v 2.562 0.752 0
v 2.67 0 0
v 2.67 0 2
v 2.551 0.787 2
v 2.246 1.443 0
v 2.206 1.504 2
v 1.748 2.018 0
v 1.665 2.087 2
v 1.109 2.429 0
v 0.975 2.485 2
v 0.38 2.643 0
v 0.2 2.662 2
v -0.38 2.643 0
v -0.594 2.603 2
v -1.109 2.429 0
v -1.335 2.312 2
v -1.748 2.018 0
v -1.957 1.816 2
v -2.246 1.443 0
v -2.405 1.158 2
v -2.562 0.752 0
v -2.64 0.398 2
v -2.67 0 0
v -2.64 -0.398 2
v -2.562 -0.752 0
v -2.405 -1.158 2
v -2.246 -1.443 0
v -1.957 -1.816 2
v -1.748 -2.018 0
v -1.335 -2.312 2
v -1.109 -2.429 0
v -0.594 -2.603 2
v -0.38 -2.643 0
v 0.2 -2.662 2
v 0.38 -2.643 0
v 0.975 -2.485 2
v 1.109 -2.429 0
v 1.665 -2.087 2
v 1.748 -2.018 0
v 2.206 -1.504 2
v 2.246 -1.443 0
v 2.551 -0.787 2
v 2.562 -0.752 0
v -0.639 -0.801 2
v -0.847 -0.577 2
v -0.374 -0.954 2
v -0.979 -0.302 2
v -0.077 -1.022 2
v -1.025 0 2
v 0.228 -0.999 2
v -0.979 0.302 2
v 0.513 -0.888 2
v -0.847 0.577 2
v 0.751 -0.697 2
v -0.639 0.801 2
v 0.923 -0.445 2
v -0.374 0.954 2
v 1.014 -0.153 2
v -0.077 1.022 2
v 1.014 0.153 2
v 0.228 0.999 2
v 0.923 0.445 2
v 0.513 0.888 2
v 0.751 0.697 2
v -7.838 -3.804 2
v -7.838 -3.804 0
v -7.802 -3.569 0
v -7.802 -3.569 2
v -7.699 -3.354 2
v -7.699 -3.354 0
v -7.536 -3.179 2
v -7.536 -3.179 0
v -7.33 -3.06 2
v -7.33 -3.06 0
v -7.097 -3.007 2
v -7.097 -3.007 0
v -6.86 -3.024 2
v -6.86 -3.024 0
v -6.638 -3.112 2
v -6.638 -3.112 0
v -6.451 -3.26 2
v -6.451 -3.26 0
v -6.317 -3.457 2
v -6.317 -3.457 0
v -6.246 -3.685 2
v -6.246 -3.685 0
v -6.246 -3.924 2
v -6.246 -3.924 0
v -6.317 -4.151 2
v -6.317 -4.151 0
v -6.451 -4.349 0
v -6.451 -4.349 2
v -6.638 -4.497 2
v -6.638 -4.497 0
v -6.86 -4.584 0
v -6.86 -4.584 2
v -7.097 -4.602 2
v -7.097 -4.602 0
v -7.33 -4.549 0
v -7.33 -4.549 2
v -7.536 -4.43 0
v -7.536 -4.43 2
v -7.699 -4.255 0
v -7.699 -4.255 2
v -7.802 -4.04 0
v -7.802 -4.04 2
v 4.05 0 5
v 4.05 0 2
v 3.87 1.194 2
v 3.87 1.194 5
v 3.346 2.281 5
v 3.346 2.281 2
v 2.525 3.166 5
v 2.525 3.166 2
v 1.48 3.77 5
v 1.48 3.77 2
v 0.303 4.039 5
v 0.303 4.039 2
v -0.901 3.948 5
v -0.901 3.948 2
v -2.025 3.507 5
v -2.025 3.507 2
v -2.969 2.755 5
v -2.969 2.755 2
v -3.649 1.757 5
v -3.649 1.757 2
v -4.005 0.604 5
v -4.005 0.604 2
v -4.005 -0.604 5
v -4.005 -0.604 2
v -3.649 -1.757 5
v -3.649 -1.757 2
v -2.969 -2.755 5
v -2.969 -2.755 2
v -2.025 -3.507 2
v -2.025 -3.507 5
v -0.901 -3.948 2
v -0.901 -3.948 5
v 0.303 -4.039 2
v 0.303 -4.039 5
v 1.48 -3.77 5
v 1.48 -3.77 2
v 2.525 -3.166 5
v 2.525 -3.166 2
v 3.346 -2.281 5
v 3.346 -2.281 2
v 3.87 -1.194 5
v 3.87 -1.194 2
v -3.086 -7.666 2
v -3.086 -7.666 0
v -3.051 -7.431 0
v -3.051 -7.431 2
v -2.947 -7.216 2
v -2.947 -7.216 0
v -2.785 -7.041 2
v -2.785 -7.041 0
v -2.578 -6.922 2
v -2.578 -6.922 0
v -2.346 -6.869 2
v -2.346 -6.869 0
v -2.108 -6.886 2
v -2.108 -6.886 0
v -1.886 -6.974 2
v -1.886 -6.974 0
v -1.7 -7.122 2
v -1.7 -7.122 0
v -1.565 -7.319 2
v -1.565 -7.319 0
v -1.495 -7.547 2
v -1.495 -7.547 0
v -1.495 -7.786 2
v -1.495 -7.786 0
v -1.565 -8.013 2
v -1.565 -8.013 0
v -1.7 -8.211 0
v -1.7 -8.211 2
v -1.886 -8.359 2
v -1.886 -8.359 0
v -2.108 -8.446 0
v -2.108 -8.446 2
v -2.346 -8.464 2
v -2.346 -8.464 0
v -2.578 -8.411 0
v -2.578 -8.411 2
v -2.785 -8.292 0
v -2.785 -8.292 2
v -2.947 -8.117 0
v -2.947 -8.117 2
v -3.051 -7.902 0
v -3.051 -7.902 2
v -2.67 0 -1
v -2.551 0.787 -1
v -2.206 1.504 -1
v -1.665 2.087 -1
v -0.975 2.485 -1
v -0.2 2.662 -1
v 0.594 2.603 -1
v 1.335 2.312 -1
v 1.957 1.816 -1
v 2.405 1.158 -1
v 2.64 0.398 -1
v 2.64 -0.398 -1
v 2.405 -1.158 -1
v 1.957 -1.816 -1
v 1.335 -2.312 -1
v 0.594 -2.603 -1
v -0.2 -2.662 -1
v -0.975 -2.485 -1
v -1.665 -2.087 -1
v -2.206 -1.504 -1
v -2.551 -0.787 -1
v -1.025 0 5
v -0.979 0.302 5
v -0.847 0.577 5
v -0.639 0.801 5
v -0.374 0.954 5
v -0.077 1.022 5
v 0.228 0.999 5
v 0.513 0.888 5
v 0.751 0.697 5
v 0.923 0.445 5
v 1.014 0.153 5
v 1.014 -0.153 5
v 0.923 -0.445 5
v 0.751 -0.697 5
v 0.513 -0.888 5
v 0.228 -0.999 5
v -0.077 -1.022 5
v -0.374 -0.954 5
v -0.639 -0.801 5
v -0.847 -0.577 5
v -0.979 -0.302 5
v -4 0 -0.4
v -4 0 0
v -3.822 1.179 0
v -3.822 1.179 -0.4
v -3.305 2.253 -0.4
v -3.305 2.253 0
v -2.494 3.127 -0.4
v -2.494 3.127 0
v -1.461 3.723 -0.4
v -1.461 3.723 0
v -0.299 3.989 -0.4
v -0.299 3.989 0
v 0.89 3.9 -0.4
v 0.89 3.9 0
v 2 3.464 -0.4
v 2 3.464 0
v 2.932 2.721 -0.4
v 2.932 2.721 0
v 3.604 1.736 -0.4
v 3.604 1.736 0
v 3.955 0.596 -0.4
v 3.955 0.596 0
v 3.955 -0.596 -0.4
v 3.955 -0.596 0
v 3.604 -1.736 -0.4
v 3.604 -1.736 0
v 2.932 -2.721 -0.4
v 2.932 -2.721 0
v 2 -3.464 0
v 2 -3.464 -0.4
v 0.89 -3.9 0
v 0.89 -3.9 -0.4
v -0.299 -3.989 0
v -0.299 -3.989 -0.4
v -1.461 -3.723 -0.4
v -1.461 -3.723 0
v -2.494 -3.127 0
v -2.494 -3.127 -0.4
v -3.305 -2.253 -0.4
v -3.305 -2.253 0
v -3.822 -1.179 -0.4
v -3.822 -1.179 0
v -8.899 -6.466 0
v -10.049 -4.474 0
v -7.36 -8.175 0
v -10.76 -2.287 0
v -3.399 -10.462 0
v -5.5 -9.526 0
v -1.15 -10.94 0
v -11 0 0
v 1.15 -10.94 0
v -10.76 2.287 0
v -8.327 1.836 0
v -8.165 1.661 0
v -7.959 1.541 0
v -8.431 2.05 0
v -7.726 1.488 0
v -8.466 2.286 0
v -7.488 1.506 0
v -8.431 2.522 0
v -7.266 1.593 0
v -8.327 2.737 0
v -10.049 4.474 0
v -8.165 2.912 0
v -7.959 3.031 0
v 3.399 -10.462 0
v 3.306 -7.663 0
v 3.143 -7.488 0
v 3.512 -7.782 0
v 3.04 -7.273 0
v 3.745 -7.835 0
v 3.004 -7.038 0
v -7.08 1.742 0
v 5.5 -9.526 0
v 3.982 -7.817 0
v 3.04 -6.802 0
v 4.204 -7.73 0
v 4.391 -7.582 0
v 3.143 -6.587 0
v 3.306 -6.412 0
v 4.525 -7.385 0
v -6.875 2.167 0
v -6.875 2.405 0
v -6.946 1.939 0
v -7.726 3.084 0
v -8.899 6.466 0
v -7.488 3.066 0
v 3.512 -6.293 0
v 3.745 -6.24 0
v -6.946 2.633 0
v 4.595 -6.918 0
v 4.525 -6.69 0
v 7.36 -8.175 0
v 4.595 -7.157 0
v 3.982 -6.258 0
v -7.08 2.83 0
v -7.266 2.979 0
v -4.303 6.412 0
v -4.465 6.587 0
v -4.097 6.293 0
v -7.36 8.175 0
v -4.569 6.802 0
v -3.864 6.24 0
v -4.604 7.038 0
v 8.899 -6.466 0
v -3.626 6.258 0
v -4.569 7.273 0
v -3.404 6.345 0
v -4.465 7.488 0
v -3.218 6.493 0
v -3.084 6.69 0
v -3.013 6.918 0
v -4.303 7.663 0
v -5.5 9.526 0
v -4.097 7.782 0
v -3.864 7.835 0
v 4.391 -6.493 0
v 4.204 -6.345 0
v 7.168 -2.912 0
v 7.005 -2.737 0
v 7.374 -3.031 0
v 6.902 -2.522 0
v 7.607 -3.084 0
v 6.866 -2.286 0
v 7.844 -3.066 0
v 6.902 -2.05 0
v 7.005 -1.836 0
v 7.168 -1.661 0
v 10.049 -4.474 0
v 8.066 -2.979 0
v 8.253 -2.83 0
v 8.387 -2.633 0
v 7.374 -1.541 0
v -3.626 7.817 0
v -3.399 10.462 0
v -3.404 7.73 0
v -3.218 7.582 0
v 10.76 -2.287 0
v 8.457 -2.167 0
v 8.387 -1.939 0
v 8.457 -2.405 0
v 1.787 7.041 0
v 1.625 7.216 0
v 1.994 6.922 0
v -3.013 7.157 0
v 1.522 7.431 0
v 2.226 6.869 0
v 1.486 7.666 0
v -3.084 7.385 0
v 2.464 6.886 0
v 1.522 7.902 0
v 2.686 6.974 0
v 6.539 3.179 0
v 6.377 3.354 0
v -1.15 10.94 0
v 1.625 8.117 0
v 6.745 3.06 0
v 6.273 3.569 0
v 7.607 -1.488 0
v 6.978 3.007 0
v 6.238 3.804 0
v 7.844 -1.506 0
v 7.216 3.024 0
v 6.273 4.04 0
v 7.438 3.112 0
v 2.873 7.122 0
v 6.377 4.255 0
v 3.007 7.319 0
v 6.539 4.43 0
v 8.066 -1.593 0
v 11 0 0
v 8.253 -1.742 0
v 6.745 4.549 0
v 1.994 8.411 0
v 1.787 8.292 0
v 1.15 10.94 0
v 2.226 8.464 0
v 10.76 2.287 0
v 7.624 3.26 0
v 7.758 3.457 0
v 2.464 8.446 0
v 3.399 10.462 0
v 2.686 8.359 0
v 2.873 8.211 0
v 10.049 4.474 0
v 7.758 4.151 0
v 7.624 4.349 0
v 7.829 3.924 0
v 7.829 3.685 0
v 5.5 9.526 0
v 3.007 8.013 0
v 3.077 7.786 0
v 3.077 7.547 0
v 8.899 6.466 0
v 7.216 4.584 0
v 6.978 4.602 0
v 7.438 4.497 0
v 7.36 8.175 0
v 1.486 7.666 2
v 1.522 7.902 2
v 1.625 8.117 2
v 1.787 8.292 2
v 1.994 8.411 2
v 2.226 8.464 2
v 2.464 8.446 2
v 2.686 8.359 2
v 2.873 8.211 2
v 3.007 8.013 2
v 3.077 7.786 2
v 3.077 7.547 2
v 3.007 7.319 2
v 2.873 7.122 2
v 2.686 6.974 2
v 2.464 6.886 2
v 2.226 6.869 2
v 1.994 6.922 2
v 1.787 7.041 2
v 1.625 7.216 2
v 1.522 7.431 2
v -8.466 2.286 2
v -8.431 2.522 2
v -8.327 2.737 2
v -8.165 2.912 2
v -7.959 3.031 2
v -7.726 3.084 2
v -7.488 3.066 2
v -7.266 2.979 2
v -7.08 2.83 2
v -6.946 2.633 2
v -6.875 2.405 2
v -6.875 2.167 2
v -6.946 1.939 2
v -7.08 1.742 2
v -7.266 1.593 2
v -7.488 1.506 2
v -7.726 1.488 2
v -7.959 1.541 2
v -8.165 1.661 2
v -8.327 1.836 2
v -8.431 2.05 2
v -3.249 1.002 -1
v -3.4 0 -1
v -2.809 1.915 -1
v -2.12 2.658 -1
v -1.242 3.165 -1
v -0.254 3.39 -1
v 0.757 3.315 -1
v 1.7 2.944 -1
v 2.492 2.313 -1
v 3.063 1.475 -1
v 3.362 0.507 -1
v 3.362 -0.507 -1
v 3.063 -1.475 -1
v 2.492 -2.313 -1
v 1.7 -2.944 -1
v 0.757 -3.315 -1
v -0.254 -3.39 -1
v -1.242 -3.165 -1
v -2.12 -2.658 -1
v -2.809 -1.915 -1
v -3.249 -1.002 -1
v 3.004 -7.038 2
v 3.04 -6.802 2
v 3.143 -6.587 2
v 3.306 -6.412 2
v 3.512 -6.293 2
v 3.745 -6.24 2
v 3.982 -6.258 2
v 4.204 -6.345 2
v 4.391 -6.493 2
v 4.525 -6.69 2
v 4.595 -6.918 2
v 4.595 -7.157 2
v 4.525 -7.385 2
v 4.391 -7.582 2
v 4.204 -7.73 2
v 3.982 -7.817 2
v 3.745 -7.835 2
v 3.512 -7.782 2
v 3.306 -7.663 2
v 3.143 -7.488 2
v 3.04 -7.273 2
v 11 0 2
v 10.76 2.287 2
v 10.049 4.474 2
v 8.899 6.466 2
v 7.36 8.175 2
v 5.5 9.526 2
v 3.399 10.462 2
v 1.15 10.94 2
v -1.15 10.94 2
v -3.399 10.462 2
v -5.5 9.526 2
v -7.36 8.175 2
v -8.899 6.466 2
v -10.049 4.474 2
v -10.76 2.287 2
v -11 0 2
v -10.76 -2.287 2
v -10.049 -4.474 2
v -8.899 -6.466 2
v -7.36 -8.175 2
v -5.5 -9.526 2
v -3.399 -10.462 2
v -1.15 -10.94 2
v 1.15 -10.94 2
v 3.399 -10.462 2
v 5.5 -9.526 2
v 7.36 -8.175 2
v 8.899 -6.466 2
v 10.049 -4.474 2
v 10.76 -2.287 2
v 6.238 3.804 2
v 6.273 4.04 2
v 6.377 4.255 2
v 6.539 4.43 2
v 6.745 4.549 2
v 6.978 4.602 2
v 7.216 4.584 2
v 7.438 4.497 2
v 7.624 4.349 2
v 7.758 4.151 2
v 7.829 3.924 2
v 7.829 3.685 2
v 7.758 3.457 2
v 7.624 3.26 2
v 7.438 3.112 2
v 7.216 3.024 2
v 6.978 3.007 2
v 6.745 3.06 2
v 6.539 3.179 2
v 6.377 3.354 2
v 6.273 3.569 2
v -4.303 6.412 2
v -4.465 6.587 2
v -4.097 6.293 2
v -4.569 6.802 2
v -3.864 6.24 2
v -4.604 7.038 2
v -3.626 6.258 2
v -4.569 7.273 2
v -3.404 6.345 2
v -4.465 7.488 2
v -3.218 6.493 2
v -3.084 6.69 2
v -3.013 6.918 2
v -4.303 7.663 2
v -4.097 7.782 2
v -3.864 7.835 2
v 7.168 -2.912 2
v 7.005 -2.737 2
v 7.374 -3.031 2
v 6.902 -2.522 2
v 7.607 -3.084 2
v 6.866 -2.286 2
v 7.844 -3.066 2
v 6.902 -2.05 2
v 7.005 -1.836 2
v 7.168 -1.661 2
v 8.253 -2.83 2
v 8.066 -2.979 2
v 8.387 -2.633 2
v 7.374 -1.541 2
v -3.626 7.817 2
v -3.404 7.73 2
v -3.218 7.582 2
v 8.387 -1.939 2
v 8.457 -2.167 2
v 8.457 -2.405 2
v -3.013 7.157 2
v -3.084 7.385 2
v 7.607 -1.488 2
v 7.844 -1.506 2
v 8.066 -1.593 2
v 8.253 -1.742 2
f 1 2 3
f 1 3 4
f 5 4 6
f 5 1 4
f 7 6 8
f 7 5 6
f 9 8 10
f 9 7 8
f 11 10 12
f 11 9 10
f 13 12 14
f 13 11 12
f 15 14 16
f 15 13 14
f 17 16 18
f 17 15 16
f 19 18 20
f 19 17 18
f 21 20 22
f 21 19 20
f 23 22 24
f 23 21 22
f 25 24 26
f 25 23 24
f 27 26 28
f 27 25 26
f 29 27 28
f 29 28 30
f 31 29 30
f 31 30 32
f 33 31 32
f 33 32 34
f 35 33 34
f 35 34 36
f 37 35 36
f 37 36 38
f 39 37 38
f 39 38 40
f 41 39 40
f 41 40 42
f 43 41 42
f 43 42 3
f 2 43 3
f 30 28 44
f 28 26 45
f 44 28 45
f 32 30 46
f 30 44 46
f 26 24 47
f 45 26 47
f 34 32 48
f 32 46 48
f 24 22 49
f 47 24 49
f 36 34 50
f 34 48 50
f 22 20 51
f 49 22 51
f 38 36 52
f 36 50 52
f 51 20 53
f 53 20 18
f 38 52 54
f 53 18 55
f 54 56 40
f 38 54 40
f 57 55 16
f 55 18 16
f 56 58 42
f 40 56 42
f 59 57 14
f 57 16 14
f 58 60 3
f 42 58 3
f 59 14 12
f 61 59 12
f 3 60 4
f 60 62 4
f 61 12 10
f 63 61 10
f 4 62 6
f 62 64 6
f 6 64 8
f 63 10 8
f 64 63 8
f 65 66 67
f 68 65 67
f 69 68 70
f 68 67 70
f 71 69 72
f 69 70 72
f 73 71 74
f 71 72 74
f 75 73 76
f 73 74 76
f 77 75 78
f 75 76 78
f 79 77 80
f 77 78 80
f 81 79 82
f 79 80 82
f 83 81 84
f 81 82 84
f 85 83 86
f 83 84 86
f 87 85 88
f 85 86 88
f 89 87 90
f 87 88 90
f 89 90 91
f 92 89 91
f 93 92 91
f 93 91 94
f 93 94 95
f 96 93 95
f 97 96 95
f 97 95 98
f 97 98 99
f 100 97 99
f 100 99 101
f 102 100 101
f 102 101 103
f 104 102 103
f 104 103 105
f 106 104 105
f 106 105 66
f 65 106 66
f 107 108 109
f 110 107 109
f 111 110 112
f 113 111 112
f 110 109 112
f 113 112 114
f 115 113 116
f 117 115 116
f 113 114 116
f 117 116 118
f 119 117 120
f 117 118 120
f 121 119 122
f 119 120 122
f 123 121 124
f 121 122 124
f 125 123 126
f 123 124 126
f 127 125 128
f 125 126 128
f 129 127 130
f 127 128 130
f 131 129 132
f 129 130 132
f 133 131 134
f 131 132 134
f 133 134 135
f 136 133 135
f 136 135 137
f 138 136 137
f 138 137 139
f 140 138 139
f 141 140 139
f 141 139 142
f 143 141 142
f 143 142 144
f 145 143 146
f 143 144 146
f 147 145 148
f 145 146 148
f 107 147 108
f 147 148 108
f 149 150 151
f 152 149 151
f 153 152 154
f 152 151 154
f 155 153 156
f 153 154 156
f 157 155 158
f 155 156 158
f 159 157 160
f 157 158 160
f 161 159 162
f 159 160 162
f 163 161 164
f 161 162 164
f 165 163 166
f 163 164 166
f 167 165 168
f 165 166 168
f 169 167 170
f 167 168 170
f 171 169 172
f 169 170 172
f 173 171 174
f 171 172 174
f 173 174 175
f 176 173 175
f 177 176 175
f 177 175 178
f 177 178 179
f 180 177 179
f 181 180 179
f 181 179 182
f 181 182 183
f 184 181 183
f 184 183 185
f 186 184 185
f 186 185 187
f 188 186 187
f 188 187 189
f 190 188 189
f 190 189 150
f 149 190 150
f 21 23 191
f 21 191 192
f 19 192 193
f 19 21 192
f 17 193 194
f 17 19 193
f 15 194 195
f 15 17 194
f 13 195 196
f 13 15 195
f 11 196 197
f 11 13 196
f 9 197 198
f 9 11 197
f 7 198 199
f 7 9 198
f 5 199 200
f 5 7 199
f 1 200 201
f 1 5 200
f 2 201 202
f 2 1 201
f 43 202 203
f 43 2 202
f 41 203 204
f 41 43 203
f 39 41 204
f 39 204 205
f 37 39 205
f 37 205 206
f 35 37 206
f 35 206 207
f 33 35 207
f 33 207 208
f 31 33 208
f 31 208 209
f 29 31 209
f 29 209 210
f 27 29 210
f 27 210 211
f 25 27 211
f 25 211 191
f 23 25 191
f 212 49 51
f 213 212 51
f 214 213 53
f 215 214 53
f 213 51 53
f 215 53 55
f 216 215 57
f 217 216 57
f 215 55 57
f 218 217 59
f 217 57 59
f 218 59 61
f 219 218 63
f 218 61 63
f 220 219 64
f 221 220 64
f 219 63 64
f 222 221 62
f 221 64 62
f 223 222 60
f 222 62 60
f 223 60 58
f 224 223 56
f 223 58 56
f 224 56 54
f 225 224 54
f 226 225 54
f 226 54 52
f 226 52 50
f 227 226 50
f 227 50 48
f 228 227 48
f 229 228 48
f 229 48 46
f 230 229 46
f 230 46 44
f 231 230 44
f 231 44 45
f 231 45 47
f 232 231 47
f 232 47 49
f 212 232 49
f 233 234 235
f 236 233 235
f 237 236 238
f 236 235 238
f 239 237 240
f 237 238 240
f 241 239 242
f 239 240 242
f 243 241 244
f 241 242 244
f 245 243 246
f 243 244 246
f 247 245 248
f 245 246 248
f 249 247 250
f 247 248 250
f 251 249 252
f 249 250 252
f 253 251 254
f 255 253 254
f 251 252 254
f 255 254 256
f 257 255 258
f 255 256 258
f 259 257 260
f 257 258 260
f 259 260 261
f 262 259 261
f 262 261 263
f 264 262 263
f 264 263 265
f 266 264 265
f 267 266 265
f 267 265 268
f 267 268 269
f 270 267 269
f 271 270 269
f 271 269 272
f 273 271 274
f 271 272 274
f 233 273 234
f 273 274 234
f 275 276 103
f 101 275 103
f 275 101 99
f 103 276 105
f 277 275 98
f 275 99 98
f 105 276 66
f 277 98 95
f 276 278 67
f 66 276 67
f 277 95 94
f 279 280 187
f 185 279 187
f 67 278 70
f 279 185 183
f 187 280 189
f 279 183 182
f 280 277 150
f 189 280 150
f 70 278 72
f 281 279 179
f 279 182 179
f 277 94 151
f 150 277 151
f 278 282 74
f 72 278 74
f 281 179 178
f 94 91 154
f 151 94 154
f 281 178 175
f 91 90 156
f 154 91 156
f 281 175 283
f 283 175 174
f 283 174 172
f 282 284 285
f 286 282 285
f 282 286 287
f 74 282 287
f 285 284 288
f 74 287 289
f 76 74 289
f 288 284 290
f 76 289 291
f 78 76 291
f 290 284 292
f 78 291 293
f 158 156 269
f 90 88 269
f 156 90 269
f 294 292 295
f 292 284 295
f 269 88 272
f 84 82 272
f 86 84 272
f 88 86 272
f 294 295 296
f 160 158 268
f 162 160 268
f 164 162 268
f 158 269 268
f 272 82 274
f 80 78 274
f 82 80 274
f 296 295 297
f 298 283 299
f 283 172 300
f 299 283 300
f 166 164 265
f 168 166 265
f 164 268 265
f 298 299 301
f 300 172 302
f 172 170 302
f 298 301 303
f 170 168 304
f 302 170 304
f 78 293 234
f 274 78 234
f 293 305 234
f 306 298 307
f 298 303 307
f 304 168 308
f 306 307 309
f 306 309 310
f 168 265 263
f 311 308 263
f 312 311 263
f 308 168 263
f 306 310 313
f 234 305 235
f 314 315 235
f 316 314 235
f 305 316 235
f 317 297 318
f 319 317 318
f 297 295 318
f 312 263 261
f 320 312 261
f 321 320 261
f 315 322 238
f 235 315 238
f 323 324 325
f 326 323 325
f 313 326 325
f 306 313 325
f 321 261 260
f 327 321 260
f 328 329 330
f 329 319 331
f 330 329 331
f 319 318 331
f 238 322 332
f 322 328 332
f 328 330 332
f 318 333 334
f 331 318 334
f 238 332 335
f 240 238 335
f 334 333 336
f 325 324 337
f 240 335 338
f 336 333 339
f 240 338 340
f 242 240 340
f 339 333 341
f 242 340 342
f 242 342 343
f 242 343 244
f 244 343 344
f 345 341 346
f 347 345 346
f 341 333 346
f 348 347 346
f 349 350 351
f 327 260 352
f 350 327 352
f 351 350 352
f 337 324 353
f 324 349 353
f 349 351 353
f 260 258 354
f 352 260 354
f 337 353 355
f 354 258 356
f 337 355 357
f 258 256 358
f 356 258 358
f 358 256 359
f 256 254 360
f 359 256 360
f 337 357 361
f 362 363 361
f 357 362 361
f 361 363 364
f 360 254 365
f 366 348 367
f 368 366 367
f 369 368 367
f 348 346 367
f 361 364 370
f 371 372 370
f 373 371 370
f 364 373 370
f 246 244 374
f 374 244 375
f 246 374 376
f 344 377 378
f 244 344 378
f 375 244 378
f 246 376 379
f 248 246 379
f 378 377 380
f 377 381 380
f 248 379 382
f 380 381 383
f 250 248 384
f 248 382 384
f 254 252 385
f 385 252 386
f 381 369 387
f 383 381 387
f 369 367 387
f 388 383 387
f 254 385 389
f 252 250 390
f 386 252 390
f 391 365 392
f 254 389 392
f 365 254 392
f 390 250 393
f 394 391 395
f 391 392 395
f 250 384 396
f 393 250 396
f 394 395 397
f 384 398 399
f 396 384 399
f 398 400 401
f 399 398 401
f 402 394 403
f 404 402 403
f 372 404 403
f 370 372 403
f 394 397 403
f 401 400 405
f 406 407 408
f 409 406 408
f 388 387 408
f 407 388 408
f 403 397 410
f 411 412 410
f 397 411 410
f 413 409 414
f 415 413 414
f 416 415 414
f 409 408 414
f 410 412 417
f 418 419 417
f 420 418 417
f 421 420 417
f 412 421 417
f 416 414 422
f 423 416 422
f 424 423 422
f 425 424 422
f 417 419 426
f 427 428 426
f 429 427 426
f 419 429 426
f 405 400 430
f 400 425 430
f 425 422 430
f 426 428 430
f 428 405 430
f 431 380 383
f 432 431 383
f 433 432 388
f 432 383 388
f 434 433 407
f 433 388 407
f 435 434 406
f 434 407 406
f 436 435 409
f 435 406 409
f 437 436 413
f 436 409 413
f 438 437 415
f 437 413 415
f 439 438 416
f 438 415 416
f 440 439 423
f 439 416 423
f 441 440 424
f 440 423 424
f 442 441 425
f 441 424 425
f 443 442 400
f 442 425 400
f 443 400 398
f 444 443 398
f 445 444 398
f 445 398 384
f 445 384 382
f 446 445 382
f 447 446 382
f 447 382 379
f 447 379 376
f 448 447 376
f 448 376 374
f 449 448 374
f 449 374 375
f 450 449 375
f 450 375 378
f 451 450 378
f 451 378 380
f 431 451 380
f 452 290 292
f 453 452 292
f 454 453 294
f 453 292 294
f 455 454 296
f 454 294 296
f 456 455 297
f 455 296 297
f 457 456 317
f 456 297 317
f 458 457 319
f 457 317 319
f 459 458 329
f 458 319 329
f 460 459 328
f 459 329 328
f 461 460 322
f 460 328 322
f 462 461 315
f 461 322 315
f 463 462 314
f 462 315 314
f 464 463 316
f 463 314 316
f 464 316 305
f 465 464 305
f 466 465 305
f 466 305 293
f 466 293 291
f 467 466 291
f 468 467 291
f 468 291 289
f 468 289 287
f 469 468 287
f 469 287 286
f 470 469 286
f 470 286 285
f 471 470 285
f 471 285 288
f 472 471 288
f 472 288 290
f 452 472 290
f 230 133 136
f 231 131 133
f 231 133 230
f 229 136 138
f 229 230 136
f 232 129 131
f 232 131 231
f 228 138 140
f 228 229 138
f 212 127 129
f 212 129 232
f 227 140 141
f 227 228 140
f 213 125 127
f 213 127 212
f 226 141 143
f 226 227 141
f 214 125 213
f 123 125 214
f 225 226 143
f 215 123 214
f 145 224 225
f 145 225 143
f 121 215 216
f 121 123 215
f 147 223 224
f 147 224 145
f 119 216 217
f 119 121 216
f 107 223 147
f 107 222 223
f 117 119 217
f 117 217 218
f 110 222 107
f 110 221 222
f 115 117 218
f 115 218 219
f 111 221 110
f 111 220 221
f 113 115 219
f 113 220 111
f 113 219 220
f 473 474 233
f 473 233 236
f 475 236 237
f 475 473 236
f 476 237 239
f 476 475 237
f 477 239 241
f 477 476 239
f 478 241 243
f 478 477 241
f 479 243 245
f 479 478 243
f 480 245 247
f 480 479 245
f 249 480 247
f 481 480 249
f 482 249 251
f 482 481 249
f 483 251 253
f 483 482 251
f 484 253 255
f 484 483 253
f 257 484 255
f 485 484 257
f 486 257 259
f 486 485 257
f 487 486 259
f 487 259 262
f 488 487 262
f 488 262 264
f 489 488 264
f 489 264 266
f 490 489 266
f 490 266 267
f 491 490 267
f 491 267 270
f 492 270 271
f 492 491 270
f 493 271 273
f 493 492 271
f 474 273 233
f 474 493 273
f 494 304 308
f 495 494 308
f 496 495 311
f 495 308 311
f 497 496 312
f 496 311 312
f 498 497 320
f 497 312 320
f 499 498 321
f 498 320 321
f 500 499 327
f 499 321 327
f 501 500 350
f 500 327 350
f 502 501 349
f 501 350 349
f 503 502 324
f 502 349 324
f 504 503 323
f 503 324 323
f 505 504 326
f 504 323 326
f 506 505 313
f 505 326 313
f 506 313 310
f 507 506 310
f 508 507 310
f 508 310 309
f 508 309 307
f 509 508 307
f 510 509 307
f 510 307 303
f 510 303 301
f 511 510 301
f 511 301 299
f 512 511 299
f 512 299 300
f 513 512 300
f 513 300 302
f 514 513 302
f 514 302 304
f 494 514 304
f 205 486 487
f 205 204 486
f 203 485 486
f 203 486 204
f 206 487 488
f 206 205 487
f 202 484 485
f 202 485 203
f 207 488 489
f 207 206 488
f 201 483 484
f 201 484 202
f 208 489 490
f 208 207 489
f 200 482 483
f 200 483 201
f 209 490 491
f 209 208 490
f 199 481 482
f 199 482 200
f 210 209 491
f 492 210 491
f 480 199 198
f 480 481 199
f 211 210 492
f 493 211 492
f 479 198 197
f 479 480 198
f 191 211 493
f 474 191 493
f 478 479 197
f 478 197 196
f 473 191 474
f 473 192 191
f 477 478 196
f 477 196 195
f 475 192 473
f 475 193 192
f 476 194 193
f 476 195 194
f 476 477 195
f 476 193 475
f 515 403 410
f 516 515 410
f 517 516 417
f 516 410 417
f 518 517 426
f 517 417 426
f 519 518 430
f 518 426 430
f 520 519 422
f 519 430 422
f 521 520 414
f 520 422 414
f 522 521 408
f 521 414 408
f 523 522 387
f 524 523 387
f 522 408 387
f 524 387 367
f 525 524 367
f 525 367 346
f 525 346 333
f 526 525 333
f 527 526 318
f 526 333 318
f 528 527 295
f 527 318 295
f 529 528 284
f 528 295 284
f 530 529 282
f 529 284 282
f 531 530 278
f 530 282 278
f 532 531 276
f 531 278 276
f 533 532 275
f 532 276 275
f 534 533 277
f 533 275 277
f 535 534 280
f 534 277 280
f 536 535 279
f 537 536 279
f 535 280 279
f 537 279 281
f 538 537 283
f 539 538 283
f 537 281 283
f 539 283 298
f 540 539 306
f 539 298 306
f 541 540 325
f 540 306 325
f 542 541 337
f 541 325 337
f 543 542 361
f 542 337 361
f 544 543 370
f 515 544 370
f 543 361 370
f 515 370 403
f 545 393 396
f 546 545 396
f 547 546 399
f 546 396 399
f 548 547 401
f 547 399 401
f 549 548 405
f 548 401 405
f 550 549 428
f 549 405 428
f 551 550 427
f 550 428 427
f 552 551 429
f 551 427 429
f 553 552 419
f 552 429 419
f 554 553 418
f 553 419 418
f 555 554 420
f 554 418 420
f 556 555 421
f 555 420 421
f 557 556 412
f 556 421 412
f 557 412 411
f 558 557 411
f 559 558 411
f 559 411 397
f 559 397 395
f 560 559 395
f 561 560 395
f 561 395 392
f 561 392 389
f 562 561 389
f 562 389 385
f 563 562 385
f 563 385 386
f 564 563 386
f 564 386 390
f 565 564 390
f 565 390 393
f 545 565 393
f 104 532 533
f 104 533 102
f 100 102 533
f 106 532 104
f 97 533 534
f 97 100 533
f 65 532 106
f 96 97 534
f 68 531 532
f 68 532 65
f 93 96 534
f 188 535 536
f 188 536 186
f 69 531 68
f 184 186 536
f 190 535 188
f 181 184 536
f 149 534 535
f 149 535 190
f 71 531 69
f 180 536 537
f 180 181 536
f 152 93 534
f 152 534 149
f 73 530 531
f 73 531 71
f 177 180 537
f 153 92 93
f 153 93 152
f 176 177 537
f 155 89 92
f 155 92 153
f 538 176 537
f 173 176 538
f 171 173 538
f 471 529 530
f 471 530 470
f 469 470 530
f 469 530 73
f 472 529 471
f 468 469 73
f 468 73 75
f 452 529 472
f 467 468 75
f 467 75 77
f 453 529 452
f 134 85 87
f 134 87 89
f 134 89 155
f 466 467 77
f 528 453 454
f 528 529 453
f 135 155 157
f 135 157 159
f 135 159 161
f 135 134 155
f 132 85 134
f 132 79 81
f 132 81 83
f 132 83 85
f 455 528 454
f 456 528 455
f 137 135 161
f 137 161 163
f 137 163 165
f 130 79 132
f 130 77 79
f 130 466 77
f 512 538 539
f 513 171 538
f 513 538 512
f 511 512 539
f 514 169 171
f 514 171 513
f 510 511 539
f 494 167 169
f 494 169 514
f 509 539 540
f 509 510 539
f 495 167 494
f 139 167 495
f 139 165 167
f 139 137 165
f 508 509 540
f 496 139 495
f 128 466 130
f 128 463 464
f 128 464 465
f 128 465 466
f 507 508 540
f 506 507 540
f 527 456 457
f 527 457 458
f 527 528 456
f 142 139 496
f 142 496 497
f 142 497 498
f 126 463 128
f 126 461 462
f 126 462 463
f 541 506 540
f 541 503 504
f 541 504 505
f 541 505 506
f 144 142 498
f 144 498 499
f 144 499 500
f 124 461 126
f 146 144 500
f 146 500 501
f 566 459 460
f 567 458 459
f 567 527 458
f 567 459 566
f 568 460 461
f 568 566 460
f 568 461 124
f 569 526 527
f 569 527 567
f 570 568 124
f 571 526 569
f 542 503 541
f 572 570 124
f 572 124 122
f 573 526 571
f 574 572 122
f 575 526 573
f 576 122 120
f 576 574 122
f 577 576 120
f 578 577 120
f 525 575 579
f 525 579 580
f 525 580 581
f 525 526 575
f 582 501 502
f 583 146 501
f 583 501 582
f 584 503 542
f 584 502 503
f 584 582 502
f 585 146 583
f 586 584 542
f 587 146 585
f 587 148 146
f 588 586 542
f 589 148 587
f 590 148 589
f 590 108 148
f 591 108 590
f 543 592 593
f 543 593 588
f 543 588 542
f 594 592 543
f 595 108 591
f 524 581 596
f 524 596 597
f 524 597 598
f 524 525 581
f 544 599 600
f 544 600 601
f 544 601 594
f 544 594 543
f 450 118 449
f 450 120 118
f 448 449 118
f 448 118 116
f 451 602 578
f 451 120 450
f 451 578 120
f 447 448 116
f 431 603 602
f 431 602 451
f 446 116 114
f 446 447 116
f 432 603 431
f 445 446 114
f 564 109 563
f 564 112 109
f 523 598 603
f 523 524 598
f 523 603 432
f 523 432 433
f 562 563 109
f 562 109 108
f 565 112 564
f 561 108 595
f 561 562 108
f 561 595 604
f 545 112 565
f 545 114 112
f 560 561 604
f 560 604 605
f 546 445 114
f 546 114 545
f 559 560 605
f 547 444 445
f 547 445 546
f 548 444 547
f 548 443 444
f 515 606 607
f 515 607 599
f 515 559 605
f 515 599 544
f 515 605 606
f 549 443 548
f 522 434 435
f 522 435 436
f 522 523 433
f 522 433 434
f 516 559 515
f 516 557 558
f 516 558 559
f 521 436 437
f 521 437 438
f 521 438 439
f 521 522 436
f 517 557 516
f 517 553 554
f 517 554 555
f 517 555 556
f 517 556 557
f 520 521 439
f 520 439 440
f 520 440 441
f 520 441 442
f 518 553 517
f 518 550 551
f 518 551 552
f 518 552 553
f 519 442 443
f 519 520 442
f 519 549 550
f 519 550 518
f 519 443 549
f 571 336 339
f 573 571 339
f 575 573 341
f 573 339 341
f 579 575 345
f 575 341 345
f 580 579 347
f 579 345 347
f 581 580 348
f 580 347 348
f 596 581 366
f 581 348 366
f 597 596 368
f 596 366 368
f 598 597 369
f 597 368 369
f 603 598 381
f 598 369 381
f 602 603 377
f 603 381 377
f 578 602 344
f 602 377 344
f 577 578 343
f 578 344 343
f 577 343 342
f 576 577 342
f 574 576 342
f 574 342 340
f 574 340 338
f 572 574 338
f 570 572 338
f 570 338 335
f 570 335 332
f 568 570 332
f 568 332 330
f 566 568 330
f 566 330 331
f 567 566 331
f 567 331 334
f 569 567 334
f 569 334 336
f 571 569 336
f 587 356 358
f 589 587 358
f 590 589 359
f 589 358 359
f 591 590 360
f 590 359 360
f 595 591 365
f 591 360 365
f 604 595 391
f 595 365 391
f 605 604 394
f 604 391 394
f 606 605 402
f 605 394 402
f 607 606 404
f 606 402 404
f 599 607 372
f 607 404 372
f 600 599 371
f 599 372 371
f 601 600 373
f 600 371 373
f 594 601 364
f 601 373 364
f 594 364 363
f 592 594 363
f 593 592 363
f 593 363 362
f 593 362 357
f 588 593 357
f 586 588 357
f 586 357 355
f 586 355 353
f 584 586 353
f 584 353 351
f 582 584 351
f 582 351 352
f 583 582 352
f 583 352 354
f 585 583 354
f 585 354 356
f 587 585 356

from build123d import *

# Parameters (mm, degrees)
SKETCH1_R               = 11
SKETCH1_R_2             = 2.669858215
BOSS_EXTRUDE1_DEPTH     = 2
SKETCH2_R               = 4.05
BOSS_EXTRUDE2_DEPTH     = 3
SKETCH3_R               = 4
SKETCH3_R_2             = 2.669858215
BOSS_EXTRUDE3_DEPTH     = 1
CHAMFER1_SIZE           = 0.6
M2_TAPPED_HOLE1_D       = 1.6
M2_5_TAPPED_HOLE1_D     = 2.05
M2_5_TAPPED_HOLE1_DEPTH = 6.35
M2_5_TAPPED_HOLE1_TIP   = 0.615882135


with BuildPart() as part:
    # Sketch1 → Boss-Extrude1 (new body)
    with BuildSketch(Plane.XY):
        Circle(SKETCH1_R)
        Circle(SKETCH1_R_2, mode=Mode.SUBTRACT)
    extrude(amount=BOSS_EXTRUDE1_DEPTH)

    # Sketch2 → Boss-Extrude2 (add)
    with BuildSketch(Plane.XY.offset(2)):
        Circle(SKETCH2_R)
    extrude(amount=BOSS_EXTRUDE2_DEPTH)

    # Sketch3 → Boss-Extrude3 (add)
    with BuildSketch(Plane(origin=(0, 0, 0), x_dir=(-1, 0, 0), z_dir=(0, 0, -1))):
        Circle(SKETCH3_R)
        Circle(SKETCH3_R_2, mode=Mode.SUBTRACT)
    extrude(amount=BOSS_EXTRUDE3_DEPTH)

    # Chamfer1
    chamfer1_edges = [part.edges().sort_by_distance(p)[0] for p in [
        (4, 0, -1),
    ]]
    chamfer(chamfer1_edges, length=CHAMFER1_SIZE)

    # M2 Tapped Hole1 (through all)
    with Locations(Plane.XY.offset(2)):
        with Locations((2.286188648, 7.666377336), (7.037526898, 3.804367906), (7.666377336, -2.286188648), (3.804367906, -7.037526898), (-2.286188648, -7.666377336), (-7.037526898, -3.804367906), (-7.666377336, 2.286188648), (-3.804367906, 7.037526898)):
            Hole(M2_TAPPED_HOLE1_D / 2)

    # M2.5 Tapped Hole1
    with Locations(Plane.XY.offset(5)):
        with Locations((0, 0)):
            Hole(M2_5_TAPPED_HOLE1_D / 2, depth=M2_5_TAPPED_HOLE1_DEPTH)
            with Locations((0, 0, -(M2_5_TAPPED_HOLE1_DEPTH + M2_5_TAPPED_HOLE1_TIP / 2))):  # 118° drill point
                Cone(0, M2_5_TAPPED_HOLE1_D / 2, M2_5_TAPPED_HOLE1_TIP, mode=Mode.SUBTRACT)


solid = part.part
